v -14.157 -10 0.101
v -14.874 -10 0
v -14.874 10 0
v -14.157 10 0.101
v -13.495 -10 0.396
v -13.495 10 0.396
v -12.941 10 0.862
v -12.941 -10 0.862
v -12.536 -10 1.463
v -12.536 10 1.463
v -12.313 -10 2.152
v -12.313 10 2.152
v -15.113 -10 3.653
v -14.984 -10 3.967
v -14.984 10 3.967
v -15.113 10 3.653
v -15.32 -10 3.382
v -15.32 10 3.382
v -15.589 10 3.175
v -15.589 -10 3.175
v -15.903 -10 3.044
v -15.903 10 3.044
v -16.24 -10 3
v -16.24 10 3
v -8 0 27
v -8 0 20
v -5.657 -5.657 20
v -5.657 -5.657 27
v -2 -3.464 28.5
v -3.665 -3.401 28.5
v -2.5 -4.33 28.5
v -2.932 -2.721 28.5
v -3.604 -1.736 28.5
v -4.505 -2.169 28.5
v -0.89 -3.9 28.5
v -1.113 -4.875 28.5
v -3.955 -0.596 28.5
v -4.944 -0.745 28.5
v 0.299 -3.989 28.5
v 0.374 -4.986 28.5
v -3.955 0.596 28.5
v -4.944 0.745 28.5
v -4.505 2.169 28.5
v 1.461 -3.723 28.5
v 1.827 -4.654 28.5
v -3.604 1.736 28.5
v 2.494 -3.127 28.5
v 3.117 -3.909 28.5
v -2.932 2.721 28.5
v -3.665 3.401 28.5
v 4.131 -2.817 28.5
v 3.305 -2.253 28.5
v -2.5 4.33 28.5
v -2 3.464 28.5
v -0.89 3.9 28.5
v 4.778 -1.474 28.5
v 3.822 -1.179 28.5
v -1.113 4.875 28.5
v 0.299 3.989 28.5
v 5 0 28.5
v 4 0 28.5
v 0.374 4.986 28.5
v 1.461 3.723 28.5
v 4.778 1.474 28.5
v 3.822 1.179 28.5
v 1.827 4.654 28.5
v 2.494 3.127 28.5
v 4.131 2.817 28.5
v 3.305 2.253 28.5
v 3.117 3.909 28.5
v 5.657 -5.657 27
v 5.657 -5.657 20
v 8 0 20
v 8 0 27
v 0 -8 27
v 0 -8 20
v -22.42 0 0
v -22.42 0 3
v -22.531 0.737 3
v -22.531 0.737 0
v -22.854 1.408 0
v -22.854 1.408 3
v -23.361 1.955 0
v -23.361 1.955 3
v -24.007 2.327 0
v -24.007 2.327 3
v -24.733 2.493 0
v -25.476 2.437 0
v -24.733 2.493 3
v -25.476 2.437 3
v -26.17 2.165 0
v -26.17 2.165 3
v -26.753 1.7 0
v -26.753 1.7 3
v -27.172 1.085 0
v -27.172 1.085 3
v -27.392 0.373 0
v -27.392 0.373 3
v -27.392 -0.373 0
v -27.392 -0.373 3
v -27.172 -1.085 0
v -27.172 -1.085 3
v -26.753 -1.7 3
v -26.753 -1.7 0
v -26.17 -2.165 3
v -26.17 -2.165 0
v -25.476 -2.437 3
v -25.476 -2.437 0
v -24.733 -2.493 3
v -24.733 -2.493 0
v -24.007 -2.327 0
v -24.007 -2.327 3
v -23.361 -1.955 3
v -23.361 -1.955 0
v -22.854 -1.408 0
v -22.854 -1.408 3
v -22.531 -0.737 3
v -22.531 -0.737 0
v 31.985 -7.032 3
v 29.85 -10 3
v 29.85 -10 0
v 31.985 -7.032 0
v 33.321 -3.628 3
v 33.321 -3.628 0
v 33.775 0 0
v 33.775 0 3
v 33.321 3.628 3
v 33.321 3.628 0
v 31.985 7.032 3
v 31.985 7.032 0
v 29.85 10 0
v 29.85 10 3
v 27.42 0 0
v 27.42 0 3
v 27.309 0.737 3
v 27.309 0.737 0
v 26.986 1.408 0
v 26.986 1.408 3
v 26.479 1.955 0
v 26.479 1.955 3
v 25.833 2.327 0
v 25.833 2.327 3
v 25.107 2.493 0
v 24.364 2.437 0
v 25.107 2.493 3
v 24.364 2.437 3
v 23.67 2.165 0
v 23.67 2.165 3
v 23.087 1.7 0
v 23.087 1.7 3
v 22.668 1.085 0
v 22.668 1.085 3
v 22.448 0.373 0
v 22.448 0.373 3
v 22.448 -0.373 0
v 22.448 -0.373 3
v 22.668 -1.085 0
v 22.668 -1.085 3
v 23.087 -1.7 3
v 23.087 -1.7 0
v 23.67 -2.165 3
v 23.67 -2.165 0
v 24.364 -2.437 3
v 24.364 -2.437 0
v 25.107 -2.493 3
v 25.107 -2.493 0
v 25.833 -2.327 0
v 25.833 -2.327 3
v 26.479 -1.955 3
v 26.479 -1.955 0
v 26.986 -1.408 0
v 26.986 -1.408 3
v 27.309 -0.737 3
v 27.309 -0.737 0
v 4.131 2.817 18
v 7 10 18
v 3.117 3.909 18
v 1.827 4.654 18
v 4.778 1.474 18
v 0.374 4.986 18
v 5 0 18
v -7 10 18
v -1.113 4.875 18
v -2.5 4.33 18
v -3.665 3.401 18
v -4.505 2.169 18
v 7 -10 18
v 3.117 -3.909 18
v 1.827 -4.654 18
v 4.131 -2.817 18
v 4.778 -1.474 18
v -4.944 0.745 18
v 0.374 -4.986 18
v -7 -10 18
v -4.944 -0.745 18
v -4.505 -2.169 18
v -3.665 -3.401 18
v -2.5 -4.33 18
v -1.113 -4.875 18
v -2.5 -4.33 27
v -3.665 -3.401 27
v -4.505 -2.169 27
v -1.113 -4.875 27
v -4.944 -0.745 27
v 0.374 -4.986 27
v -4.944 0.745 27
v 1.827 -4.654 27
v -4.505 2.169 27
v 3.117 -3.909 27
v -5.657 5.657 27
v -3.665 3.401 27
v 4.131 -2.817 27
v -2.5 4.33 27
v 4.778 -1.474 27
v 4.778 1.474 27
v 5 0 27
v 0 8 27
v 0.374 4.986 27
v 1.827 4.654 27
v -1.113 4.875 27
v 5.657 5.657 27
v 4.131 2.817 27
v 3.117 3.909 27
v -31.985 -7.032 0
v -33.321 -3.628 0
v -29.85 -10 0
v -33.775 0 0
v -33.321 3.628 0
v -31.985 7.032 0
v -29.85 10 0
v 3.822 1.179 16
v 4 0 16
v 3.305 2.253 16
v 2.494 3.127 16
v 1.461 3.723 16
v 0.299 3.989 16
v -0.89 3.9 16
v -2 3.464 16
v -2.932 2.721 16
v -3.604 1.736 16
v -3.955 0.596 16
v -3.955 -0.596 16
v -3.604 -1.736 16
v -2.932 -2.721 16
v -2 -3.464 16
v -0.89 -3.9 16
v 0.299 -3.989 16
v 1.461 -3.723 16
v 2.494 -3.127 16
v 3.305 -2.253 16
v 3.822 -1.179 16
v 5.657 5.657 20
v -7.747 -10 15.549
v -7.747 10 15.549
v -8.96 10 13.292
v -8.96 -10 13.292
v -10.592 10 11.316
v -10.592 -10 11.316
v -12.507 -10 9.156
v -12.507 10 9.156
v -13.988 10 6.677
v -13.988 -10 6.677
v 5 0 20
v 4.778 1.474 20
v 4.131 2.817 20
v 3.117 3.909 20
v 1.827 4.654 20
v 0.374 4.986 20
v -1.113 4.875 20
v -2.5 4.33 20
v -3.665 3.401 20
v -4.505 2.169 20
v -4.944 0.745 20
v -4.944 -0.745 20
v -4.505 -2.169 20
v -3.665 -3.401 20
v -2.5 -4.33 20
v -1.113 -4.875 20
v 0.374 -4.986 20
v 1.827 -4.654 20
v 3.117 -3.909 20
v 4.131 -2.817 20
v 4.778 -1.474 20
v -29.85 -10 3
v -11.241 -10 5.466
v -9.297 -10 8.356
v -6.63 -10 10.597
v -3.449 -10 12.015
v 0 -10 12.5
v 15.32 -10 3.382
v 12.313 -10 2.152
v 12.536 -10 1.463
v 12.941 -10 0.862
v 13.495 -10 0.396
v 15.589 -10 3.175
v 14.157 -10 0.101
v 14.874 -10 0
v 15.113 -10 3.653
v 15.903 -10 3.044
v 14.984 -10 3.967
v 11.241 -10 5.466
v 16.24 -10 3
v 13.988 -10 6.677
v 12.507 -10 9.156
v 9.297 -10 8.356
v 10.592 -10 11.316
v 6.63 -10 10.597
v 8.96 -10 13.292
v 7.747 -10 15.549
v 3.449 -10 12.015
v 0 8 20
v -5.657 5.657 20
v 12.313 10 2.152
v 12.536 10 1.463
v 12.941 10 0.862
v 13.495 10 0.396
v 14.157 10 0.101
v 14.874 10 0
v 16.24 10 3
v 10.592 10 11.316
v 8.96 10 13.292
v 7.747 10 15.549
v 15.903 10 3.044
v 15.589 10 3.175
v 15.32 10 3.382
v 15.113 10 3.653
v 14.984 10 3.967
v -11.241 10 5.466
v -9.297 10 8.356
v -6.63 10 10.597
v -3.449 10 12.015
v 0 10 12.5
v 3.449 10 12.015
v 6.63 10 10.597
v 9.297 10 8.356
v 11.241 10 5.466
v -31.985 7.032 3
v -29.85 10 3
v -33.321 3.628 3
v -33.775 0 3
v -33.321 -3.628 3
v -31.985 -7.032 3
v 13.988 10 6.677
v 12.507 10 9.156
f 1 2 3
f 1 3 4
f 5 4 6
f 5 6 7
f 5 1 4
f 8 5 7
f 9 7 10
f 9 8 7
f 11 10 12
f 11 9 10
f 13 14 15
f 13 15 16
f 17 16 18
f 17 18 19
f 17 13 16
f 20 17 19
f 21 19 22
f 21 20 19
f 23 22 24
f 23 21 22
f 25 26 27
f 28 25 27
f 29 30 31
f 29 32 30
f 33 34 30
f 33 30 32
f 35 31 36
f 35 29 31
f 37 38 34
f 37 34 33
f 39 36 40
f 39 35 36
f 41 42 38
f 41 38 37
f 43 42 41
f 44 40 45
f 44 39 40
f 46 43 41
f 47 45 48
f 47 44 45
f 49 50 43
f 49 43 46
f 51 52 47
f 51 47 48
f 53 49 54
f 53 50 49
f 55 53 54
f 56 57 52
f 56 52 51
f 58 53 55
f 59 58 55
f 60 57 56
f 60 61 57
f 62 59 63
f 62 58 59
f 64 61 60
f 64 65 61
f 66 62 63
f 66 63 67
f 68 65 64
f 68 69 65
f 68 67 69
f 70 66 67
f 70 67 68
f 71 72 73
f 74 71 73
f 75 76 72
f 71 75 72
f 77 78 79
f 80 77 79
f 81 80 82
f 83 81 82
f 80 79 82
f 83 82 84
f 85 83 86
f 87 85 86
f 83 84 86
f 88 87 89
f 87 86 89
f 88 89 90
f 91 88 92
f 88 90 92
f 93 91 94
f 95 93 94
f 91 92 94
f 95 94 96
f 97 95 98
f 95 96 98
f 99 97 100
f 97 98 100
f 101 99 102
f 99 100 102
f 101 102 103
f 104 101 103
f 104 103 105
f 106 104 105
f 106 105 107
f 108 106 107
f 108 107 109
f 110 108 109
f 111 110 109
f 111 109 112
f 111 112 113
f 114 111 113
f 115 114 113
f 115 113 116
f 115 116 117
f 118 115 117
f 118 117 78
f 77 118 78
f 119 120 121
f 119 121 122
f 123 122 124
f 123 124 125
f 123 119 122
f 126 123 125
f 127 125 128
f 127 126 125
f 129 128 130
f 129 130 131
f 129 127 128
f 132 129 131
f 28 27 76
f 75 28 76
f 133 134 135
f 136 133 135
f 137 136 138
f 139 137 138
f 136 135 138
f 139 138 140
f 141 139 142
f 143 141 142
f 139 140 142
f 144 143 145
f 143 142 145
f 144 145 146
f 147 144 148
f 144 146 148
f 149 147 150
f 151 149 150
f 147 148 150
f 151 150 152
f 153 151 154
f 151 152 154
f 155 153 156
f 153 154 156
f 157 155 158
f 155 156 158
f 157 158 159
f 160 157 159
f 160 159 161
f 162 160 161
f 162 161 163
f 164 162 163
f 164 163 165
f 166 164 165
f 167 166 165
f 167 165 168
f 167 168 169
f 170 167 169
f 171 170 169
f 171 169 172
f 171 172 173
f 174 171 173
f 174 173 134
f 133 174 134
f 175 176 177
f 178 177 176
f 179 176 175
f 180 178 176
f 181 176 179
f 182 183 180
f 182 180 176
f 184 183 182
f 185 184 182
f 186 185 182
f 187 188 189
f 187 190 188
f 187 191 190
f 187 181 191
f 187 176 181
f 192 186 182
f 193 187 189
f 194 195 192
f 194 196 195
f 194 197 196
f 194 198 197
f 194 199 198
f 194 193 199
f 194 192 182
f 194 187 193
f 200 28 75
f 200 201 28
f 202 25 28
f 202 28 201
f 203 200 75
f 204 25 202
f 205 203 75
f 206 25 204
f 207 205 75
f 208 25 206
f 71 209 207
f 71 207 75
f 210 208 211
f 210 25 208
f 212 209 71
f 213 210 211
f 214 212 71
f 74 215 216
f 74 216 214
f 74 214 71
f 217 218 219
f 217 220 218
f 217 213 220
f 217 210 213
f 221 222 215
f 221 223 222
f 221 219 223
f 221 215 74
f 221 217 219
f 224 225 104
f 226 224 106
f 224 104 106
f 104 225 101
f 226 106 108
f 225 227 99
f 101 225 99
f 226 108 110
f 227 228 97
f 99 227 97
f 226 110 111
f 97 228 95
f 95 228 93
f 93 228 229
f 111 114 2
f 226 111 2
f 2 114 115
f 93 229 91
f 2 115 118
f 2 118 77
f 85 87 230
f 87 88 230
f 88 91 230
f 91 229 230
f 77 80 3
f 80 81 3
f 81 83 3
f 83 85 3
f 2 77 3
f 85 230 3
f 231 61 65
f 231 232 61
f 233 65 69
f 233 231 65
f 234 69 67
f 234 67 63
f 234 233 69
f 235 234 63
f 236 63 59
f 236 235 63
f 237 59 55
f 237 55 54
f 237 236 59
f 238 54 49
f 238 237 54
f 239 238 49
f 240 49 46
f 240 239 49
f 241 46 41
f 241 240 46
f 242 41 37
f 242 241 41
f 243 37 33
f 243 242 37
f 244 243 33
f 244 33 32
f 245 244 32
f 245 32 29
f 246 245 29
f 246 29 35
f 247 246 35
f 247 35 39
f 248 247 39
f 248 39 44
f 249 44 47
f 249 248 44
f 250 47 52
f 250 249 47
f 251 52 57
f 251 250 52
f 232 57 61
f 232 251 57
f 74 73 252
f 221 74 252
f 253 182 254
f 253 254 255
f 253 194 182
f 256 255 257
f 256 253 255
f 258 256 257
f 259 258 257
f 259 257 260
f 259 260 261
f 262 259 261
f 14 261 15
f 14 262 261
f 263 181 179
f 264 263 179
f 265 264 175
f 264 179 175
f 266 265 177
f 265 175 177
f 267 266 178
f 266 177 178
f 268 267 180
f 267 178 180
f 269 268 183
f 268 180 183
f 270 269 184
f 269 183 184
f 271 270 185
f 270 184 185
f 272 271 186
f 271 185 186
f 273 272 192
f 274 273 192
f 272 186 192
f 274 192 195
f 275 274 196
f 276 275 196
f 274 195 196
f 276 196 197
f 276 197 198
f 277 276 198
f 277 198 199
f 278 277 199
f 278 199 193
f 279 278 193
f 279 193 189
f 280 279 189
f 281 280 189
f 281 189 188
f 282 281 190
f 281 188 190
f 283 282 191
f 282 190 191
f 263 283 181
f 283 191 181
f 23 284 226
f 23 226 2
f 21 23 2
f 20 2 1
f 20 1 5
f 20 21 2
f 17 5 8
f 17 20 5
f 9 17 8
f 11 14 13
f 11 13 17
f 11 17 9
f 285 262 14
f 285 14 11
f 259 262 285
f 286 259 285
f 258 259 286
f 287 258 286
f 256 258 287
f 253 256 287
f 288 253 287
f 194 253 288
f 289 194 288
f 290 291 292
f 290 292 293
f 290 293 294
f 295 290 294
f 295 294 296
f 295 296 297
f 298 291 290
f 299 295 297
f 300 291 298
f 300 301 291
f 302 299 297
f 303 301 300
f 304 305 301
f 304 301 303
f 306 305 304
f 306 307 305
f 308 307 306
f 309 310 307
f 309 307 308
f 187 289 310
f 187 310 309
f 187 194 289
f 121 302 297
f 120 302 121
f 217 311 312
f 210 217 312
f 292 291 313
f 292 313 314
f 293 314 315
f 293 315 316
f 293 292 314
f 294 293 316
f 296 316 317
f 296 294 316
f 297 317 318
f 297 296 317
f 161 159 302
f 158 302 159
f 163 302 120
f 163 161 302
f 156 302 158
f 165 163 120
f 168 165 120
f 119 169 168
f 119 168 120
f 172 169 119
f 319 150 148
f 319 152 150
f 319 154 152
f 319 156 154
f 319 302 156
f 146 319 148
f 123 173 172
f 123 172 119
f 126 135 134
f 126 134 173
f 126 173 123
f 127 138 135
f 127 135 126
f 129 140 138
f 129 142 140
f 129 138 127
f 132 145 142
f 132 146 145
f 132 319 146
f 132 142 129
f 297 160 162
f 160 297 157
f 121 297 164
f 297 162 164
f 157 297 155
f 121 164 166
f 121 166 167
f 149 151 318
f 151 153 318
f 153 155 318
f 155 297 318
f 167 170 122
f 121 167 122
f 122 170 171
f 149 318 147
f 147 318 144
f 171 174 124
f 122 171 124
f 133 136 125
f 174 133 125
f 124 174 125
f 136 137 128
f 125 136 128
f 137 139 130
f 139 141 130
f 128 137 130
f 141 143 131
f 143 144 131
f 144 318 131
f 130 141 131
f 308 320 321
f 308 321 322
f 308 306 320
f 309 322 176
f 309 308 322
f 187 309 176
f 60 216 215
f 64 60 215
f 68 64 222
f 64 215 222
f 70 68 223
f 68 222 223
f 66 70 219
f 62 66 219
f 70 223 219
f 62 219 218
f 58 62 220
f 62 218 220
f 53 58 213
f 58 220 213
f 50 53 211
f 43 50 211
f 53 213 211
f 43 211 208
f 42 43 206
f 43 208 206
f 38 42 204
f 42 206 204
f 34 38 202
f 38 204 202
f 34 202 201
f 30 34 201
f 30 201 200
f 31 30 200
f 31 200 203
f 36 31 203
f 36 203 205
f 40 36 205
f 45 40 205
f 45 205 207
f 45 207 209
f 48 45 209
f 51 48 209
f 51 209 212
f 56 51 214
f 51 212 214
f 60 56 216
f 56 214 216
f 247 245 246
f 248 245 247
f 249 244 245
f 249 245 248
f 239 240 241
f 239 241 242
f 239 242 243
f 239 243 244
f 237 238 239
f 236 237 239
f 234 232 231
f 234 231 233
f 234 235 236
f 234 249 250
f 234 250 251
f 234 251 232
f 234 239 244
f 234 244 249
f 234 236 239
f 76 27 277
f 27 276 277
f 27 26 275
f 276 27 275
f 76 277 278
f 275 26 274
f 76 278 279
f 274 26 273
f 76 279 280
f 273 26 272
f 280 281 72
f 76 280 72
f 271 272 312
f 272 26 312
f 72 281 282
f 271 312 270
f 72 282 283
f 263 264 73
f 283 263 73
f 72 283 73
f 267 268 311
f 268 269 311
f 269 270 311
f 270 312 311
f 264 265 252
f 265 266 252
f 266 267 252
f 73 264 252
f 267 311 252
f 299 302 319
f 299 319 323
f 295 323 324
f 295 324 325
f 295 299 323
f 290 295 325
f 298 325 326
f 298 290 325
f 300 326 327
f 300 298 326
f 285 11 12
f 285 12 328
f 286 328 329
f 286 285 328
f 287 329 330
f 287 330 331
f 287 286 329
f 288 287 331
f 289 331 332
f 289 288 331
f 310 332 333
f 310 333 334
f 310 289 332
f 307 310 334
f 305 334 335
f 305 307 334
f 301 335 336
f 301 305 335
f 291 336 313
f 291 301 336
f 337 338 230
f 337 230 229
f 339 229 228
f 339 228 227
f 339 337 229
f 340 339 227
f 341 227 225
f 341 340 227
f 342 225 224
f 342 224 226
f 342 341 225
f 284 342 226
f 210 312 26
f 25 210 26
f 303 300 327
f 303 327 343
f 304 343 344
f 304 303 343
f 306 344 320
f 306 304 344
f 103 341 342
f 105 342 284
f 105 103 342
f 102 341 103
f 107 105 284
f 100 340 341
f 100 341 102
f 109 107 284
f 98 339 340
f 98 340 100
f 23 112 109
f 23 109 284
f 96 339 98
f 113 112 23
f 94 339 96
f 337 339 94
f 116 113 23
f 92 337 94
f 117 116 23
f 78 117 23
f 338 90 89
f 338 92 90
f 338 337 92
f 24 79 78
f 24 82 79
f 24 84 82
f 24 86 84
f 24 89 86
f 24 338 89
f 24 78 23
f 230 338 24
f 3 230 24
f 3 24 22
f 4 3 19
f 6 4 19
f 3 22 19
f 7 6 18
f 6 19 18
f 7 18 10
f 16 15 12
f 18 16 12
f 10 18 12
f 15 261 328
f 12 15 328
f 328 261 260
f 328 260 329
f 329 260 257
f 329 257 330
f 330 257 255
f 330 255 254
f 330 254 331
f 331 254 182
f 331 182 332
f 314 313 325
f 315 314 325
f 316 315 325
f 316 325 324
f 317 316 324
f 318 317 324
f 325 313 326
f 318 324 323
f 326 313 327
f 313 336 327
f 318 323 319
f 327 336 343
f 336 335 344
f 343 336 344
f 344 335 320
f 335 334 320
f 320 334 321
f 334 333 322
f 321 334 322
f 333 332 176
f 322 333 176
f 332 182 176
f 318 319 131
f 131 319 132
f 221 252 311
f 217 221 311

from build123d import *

# Parameters (mm, degrees)
F1_DEPTH  = 10
F2_R      = 2.5
F3_DEPTH  = 25
F5_DEPTH  = 3
F7_DEPTH  = 3
F8_R      = 5
F9_DEPTH  = 2
F11_DEPTH = 7
F12_R     = 5
F12_R_2   = 4
F13_DEPTH = 1.5
F14_DEPTH = 11


with BuildPart() as f1:
    # F0 (on Front) → F1 (new body, symmetric)
    with BuildSketch(Plane.XZ):
        with BuildLine():
            ThreePointArc((-7, 18), (-8.2975682269, 14.3901805601), (-10.5921510788, 11.3161979271))
            ThreePointArc((-10.5921510788, 11.3161979271), (-13.3053586993, 7.950938931), (-14.9836855606, 3.9672619048))
            ThreePointArc((-14.9836855606, 3.9672619048), (-15.4474629596, 3.2698156661), (-16.2403817689, 3))
            Line((-16.2403817689, 3), (-29.85, 3))
            Line((-29.85, 3), (-29.85, 0))
            Line((-29.85, 0), (-14.8744747806, 0))
            ThreePointArc((-14.8744747806, 0), (-13.2017484895, 0.6095259974), (-12.3133069376, 2.1523178808))
            ThreePointArc((-12.3133069376, 2.1523178808), (0, 12.5), (12.3133069376, 2.1523178808))
            ThreePointArc((12.3133069376, 2.1523178808), (13.2017484895, 0.6095259974), (14.8744747806, 0))
            Line((14.8744747806, 0), (29.85, 0))
            Line((29.85, 0), (29.85, 3))
            Line((29.85, 3), (16.2403817689, 3))
            ThreePointArc((16.2403817689, 3), (15.4474629596, 3.2698156661), (14.9836855606, 3.9672619048))
            ThreePointArc((14.9836855606, 3.9672619048), (13.3053586993, 7.950938931), (10.5921510788, 11.3161979271))
            ThreePointArc((10.5921510788, 11.3161979271), (8.2975682269, 14.3901805601), (7, 18))
            Line((7, 18), (-7, 18))
        make_face()
    extrude(amount=F1_DEPTH, both=True)

    # F2 (on face) → F3 (cut)
    with BuildSketch(Plane.XY.offset(3)):
        with Locations((-24.92, 0)):
            Circle(F2_R)
        with Locations((24.92, 0)):
            Circle(F2_R)
    extrude(amount=-F3_DEPTH, mode=Mode.SUBTRACT)

    # F4 (on face) → F5 (join, through all)
    with BuildSketch(Plane.XY.offset(3)):
        with BuildLine():
            Line((-29.85, -10), (-29.85, 10))
            ThreePointArc((-29.85, 10), (-33.7754930507, 0), (-29.85, -10))
        make_face()
    extrude(amount=-F5_DEPTH)

    # F6 (on face) → F7 (join, through all)
    with BuildSketch(Plane.XY.offset(3)):
        with BuildLine():
            Line((29.85, 10), (29.85, -10))
            ThreePointArc((29.85, -10), (33.7754930507, 0), (29.85, 10))
        make_face()
    extrude(amount=-F7_DEPTH)

    # F8 (on face) → F9 (join)
    with BuildSketch(Plane.XY.offset(18)):
        Circle(F8_R)
    extrude(amount=F9_DEPTH)

    # F10 (on face) → F11 (join)
    with BuildSketch(Plane.XY.offset(20)):
        Polygon((-5.6568542495, -5.6568542495), (0, -8), (5.6568542495, -5.6568542495), (8, 0), (5.6568542495, 5.6568542495), (0, 8), (-5.6568542495, 5.6568542495), (-8, 0), align=None)
    extrude(amount=F11_DEPTH)

    # F12 (on face) → F13 (join)
    with BuildSketch(Plane.XY.offset(27)):
        Circle(F12_R)
        Circle(F12_R_2, mode=Mode.SUBTRACT)
    extrude(amount=F13_DEPTH)

    # F14 (cut): a face of the model
    f14_faces = [f1.faces().sort_by_distance(p)[0] for p in [
        (0, 0, 27),
    ]]
    extrude(f14_faces, amount=-F14_DEPTH, mode=Mode.SUBTRACT)


solid = f1.part
